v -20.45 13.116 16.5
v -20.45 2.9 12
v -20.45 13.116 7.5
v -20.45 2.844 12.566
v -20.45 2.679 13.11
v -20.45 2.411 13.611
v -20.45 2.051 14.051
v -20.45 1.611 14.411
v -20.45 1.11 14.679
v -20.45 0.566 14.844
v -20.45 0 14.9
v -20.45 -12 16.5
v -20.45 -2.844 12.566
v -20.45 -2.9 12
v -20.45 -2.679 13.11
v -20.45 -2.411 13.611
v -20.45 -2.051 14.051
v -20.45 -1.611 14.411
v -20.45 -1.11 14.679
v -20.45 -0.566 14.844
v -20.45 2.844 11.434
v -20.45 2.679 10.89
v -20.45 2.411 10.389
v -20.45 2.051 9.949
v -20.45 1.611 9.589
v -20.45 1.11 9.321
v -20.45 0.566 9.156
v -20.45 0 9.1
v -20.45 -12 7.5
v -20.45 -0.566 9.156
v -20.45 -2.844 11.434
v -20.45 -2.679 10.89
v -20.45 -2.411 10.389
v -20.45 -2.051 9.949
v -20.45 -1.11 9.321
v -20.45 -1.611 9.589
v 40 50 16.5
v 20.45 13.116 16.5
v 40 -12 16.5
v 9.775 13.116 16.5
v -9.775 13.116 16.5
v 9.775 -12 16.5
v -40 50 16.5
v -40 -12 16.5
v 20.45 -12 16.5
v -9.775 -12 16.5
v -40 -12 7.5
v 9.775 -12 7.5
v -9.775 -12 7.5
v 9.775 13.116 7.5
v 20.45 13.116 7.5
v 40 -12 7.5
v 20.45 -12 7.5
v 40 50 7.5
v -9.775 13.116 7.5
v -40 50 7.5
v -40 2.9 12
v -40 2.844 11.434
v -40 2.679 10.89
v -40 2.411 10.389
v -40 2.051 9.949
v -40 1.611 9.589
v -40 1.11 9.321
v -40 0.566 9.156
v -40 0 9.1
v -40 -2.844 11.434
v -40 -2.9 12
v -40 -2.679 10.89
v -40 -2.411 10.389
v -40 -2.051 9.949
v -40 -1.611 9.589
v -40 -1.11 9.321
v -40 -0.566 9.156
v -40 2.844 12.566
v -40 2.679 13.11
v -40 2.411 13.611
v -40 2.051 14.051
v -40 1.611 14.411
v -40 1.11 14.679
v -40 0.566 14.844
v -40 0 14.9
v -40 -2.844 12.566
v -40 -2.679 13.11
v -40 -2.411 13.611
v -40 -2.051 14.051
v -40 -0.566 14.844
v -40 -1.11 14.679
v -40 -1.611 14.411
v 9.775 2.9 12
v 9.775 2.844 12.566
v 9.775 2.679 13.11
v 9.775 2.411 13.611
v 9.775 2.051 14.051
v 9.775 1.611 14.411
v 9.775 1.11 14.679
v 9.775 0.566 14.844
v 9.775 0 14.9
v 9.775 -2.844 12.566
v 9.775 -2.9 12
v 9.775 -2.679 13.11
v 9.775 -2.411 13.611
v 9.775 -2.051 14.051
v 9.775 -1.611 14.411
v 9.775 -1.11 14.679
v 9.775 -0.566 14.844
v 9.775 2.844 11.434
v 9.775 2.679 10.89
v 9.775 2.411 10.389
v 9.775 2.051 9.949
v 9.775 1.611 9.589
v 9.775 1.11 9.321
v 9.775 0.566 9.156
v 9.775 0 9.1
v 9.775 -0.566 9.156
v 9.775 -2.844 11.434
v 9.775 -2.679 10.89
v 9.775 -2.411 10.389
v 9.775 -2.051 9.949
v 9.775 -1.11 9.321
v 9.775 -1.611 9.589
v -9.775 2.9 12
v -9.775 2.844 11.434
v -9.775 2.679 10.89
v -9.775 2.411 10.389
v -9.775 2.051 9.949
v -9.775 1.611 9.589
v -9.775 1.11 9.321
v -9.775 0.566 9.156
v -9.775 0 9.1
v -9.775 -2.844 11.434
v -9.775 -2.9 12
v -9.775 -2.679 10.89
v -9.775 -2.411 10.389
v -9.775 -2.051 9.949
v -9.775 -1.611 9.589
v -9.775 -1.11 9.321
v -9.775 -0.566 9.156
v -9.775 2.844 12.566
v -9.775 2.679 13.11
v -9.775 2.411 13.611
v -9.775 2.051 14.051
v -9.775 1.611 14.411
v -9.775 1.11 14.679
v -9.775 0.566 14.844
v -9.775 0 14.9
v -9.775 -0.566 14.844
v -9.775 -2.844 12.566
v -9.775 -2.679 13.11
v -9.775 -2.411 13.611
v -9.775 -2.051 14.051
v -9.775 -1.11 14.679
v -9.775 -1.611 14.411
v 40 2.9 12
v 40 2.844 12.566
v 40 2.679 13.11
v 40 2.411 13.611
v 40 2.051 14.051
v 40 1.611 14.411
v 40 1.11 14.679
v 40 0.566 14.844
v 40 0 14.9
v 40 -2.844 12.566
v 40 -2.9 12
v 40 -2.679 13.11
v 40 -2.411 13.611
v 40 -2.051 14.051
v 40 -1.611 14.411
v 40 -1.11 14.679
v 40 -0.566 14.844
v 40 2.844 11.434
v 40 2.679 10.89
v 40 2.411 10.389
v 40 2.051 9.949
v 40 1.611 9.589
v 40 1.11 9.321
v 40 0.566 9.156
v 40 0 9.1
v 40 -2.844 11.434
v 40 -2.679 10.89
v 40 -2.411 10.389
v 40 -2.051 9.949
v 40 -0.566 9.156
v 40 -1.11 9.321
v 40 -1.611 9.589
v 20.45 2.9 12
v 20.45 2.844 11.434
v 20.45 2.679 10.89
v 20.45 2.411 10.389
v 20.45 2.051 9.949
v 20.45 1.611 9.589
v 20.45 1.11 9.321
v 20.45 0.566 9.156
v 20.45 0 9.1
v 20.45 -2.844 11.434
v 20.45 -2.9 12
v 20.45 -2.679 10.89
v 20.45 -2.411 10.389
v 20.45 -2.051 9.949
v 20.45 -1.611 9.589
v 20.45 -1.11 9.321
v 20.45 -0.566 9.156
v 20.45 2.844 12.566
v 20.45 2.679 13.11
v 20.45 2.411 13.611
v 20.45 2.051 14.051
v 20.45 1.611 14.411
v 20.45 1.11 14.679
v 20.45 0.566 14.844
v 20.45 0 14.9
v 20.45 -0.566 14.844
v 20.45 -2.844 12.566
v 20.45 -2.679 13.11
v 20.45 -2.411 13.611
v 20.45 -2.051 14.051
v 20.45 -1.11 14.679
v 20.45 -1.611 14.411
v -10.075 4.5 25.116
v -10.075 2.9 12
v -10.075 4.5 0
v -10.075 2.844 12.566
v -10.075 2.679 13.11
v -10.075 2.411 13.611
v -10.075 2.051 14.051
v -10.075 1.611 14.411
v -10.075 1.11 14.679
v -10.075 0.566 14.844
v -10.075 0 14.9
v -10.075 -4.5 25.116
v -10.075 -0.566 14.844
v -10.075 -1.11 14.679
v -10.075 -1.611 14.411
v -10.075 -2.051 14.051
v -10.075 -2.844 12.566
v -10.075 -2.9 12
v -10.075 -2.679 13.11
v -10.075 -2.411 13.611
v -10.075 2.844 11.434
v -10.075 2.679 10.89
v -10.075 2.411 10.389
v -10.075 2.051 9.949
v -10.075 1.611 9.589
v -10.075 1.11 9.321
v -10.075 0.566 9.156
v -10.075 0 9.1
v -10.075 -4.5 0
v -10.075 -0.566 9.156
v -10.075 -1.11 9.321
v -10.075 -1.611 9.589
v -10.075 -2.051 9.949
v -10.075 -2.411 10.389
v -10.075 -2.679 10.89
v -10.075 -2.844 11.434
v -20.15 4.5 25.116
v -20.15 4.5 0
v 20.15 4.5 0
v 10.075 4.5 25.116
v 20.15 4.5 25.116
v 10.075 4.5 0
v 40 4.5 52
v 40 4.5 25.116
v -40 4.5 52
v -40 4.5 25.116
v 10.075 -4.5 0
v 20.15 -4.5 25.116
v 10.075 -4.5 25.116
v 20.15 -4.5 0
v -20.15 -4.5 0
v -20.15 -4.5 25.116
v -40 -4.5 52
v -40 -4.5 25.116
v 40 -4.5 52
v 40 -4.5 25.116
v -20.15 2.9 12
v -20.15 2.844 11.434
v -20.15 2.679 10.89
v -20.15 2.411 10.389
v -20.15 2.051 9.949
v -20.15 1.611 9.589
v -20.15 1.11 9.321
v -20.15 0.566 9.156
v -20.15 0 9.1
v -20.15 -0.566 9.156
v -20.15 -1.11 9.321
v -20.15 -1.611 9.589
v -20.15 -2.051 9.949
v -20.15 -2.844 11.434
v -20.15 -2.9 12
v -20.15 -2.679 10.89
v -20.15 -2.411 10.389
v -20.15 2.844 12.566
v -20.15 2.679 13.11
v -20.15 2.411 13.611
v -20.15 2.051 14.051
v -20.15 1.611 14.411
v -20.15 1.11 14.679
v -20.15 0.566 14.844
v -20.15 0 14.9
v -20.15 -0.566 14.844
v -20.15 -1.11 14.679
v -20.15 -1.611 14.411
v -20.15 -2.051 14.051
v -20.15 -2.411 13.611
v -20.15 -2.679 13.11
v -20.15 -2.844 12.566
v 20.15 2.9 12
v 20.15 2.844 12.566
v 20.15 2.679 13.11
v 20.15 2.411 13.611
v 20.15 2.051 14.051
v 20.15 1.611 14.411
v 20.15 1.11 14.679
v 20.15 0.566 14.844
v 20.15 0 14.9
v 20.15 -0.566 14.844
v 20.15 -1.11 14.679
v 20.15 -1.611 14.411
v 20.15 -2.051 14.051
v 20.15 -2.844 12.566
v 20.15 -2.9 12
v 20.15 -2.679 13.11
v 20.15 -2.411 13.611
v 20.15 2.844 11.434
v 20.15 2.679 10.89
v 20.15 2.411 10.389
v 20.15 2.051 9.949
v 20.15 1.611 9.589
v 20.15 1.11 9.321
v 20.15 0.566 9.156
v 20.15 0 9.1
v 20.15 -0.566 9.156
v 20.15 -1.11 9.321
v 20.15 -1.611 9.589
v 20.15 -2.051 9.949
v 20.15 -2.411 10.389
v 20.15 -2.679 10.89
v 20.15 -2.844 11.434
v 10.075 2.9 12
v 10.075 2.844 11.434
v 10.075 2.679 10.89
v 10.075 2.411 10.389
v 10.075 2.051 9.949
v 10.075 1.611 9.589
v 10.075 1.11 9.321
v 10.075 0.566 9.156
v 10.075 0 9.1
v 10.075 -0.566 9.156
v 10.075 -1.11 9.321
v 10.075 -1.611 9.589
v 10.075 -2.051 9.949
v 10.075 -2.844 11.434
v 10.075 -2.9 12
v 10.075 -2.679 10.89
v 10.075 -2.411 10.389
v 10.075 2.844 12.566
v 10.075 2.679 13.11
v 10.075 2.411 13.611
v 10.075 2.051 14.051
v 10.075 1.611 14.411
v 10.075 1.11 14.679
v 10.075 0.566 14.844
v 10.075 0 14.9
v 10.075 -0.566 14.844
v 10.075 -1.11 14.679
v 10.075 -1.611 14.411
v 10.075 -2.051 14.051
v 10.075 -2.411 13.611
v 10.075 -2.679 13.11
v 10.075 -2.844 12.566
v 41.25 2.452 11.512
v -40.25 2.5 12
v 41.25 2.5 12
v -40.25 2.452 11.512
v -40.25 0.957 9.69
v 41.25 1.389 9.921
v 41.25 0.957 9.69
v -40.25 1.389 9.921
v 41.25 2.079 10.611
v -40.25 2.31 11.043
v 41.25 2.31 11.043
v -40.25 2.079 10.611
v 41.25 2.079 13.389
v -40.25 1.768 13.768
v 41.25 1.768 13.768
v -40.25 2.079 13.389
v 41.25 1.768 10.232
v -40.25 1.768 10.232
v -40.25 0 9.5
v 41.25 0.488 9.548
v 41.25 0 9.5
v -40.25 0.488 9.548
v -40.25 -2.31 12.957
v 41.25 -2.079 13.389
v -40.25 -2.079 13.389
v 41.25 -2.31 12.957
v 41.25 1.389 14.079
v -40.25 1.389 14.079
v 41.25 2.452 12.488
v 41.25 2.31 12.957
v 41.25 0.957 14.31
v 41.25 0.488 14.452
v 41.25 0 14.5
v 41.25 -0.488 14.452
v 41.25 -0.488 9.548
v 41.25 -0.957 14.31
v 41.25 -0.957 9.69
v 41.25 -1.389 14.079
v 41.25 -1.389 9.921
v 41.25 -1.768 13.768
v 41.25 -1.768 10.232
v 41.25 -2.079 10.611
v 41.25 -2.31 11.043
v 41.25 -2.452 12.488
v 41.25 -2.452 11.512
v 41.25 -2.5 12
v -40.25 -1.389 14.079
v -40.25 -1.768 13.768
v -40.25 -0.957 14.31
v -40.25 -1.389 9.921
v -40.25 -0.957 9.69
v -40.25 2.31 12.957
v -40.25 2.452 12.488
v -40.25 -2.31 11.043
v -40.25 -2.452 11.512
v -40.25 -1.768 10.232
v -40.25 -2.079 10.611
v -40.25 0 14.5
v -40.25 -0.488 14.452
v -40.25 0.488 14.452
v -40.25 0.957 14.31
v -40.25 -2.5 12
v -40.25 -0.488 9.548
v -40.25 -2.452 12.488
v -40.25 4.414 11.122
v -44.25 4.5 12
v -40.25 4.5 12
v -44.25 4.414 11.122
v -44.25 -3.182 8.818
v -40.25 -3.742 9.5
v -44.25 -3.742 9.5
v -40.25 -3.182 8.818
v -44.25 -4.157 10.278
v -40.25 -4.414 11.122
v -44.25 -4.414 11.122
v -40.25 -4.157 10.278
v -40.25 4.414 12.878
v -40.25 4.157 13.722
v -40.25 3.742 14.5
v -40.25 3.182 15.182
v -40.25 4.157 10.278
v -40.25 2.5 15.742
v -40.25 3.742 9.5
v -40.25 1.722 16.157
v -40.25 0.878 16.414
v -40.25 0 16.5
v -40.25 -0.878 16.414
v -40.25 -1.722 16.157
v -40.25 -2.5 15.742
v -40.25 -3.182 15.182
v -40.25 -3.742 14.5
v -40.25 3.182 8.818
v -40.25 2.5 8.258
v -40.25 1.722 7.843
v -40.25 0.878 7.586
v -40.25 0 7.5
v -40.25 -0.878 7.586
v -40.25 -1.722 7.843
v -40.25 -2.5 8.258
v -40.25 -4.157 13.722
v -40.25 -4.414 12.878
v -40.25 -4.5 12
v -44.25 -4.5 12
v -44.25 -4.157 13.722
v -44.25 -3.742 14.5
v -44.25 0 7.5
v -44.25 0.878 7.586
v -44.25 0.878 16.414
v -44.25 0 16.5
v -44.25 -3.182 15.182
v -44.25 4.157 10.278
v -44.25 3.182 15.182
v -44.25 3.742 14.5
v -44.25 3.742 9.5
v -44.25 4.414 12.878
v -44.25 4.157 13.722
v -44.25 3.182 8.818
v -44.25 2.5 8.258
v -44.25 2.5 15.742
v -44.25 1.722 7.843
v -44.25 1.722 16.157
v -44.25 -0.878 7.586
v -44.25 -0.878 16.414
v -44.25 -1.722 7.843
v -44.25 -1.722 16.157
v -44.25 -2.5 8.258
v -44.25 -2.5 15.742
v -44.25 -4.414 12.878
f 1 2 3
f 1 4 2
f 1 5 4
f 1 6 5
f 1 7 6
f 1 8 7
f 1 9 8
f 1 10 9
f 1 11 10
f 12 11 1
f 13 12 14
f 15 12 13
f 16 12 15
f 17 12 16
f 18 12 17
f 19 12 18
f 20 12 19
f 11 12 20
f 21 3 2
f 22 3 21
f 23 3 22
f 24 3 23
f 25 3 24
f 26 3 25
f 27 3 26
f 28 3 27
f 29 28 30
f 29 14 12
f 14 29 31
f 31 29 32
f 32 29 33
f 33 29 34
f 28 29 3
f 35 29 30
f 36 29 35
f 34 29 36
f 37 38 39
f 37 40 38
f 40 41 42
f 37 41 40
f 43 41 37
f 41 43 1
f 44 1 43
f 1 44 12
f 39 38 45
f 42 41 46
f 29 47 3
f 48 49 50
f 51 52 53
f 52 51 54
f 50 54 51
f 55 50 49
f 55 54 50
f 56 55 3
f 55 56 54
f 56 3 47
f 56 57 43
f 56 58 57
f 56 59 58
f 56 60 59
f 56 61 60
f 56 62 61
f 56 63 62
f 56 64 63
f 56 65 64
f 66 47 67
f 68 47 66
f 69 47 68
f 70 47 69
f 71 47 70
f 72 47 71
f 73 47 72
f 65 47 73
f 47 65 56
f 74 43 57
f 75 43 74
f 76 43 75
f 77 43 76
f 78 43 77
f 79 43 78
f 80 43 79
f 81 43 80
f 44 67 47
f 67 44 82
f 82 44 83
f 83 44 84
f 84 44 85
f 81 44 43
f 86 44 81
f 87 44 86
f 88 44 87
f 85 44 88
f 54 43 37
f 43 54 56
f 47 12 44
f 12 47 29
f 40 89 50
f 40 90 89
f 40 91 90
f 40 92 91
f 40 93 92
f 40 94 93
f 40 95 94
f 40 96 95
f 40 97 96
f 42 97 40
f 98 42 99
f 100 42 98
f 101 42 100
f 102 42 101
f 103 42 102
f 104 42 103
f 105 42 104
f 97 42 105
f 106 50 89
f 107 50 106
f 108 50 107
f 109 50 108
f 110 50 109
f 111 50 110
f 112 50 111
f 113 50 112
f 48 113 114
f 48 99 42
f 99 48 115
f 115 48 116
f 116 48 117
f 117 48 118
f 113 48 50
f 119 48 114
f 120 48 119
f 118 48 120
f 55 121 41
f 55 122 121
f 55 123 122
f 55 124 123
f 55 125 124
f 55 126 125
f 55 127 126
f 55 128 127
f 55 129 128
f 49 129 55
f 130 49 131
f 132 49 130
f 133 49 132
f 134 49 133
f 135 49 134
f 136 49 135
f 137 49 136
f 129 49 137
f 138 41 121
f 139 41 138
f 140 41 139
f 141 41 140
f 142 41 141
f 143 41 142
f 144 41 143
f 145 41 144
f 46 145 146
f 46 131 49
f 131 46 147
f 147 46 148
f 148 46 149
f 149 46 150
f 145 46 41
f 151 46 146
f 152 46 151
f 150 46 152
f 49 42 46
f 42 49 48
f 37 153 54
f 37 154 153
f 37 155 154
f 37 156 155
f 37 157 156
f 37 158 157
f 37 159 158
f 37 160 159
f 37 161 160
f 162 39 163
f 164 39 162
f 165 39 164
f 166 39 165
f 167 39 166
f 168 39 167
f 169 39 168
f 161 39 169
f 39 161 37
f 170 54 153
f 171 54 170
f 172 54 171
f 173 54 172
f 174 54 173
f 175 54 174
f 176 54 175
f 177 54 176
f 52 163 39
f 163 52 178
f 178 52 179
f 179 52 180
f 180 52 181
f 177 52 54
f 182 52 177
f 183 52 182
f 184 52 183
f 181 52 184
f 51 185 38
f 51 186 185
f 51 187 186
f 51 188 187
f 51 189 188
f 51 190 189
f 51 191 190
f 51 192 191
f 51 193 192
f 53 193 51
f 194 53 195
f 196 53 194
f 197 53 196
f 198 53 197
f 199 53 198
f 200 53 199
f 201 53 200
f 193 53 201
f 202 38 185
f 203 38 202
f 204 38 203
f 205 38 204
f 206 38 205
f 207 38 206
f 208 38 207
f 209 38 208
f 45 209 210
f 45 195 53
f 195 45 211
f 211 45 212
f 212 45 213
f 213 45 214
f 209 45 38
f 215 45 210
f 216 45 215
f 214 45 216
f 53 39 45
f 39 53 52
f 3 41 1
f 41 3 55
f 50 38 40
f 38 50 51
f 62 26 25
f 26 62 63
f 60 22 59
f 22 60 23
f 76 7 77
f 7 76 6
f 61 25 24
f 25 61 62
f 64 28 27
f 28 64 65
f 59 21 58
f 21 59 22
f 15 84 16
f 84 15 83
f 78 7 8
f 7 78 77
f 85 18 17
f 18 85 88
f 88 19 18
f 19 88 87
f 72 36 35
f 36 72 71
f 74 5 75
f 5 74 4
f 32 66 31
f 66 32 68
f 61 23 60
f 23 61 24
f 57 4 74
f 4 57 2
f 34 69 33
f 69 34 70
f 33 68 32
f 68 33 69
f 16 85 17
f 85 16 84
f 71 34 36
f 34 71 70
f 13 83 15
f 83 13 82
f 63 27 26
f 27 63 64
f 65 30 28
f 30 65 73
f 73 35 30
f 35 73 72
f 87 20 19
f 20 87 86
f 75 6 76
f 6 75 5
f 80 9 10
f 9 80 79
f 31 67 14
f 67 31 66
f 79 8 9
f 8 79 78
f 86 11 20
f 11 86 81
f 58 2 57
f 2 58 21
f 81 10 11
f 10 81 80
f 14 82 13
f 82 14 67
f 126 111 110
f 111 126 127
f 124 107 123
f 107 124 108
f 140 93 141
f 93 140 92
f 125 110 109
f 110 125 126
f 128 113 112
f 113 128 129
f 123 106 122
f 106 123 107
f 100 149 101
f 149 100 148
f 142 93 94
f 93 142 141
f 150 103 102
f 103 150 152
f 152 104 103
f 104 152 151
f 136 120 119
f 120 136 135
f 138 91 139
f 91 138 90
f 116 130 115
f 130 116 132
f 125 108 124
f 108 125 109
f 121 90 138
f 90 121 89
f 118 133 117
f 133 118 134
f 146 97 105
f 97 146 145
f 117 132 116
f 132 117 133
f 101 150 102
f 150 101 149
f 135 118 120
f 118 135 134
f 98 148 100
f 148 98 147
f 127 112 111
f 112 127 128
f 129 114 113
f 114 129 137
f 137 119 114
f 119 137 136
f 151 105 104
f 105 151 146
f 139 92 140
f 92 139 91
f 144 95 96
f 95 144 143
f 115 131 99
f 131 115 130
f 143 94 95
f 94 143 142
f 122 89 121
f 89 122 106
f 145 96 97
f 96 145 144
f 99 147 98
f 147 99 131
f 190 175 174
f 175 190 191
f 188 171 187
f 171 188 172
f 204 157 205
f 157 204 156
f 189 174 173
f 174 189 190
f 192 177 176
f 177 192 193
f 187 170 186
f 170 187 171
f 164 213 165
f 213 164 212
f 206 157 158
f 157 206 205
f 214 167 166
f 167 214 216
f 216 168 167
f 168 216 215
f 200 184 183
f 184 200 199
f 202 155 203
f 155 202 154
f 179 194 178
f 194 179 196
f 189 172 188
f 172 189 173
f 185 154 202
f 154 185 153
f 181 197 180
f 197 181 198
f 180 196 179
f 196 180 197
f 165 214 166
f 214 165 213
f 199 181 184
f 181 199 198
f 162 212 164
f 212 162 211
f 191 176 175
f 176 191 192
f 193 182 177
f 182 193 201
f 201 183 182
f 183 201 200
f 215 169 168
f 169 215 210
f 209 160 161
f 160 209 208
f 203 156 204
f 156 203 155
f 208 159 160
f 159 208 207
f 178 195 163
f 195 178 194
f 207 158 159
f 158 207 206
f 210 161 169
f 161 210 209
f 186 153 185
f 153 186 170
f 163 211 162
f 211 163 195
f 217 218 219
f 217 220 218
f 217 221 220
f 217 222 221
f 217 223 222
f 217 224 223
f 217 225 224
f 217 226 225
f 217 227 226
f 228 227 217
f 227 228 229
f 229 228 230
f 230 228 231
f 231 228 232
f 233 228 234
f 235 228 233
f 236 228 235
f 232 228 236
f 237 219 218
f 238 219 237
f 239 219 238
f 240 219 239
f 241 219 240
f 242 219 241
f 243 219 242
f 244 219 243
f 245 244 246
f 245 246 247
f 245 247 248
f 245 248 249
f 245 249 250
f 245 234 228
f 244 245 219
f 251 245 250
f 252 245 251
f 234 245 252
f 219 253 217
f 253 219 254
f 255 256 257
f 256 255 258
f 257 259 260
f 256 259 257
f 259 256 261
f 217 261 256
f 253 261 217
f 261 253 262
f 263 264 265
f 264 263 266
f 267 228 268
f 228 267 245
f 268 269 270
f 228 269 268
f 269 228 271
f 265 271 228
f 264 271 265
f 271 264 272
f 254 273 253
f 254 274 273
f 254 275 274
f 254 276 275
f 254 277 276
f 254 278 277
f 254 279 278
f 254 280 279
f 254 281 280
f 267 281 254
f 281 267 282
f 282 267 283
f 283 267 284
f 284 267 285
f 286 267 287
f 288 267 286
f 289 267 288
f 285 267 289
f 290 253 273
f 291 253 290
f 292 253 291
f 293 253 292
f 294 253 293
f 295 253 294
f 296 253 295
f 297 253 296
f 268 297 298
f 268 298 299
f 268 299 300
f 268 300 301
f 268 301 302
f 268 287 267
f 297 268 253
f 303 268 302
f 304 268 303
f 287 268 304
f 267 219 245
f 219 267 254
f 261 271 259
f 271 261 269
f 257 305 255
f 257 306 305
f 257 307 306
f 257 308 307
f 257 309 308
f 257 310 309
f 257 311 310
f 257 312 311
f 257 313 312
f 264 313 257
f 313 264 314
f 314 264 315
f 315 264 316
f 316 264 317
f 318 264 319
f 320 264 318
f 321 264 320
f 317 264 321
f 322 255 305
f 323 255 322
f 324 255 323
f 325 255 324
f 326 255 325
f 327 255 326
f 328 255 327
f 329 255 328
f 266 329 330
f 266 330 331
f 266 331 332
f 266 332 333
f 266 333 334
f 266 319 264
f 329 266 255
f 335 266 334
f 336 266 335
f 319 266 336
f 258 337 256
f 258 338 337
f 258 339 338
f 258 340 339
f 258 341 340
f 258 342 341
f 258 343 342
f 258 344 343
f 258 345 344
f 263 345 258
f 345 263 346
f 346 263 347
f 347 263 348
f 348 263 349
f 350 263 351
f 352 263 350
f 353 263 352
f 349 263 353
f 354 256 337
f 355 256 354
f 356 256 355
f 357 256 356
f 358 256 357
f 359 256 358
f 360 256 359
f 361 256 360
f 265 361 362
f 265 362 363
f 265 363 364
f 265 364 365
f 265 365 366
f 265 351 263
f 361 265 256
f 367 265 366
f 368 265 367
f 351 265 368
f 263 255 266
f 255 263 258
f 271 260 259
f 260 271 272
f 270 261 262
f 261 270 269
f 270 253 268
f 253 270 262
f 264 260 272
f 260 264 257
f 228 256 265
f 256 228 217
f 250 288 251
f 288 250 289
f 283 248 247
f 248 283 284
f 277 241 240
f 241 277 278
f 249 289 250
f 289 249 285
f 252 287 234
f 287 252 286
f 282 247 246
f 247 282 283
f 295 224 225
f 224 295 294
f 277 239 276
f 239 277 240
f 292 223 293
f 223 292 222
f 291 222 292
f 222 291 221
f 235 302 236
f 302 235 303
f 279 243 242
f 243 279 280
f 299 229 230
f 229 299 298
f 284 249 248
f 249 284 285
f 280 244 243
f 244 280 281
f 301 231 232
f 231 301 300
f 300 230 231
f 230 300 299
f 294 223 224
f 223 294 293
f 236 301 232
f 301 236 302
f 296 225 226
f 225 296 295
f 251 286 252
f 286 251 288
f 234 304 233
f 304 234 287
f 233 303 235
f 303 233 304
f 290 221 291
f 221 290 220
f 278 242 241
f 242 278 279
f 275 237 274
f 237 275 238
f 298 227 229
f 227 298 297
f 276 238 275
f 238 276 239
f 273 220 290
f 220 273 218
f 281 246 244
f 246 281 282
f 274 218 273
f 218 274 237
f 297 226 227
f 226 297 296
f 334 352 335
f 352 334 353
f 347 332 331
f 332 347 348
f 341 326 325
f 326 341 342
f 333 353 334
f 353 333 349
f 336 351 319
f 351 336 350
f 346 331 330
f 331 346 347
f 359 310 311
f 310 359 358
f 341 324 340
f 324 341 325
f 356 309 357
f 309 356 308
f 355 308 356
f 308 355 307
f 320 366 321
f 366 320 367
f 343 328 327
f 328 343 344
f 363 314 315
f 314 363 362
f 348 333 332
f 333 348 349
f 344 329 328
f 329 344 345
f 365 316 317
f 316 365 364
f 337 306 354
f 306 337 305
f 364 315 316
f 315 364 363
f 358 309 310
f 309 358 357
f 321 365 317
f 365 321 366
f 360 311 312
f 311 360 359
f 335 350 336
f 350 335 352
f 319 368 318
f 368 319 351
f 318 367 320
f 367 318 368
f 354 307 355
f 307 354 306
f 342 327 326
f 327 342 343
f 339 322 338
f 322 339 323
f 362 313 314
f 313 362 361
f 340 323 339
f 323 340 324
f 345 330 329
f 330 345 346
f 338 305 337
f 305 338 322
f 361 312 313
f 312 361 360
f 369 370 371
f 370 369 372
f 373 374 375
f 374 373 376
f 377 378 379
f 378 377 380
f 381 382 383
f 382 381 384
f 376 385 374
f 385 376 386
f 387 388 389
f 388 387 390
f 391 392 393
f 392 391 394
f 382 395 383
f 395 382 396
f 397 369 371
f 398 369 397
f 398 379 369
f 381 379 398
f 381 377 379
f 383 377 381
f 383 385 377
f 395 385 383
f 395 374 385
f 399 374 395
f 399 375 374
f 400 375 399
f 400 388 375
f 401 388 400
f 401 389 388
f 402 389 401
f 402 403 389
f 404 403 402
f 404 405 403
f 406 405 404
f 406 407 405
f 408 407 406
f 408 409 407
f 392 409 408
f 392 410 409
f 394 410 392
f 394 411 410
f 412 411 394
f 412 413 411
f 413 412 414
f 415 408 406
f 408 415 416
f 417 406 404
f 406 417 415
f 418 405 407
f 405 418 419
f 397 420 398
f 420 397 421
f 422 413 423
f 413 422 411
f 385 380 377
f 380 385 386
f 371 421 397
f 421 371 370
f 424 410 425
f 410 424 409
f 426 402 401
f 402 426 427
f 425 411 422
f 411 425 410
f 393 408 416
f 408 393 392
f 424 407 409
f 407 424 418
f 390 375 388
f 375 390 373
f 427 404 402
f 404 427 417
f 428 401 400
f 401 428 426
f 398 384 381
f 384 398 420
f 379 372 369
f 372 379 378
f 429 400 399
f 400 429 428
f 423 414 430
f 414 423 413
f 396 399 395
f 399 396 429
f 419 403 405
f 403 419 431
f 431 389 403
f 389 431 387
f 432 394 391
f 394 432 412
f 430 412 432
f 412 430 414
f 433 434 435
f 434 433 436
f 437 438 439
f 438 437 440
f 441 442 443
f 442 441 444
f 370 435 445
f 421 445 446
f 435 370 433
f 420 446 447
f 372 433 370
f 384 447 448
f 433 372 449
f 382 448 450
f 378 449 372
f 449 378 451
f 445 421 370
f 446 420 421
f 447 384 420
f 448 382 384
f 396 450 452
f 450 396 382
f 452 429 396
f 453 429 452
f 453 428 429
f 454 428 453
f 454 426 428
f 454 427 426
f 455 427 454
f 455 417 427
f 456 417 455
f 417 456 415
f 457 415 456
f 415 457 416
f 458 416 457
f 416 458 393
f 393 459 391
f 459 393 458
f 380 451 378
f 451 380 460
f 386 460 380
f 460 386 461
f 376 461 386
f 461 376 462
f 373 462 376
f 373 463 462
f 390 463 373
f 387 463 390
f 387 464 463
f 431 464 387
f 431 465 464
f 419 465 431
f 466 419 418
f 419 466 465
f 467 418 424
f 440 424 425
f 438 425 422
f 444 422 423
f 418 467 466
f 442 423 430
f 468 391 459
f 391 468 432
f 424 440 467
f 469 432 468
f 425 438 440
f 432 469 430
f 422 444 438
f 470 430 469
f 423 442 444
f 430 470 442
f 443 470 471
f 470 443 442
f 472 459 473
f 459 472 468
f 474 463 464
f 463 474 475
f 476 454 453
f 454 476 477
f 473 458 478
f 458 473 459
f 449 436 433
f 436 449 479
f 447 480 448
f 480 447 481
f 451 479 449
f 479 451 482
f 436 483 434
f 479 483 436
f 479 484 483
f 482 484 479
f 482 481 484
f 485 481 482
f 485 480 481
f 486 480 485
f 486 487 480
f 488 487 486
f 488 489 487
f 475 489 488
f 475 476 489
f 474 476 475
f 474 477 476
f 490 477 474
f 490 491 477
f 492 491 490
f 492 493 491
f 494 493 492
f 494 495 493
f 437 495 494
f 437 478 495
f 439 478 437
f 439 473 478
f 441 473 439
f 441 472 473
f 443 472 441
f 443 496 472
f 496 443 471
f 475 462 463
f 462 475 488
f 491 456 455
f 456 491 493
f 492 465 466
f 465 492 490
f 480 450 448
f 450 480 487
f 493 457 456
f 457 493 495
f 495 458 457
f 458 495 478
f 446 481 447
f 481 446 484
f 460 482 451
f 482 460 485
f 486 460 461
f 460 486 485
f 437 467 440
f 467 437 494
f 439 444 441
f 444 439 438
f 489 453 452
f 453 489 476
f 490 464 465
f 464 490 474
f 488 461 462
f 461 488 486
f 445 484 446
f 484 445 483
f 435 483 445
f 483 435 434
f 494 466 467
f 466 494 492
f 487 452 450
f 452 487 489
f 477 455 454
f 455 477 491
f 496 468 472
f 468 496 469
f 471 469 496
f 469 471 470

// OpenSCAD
$fn = 32;

// ------------------------------------------------------------------------
// Butt hinge: hinge 80 mm, leaf swung 270 deg
// Every part is its own module, assembly() places every instance.
// ------------------------------------------------------------------------

// --- part 1 ---
module hinge_base() {
  difference() {
    union() {
      translate([-40, -12, -4.5]) cube([19.55, 62, 9]);
      translate([-9.775, -12, -4.5]) cube([19.55, 62, 9]);
      translate([20.45, -12, -4.5]) cube([19.55, 62, 9]);
      translate([-40, 13.116, -4.5]) cube([80, 36.884, 9]);
    }
    translate([-30.225, 0, 0]) rotate([0, 90, 0]) cylinder(h = 21.55, d = 5.8, center = true);
    translate([0, 0, 0]) rotate([0, 90, 0]) cylinder(h = 21.55, d = 5.8, center = true);
    translate([30.225, 0, 0]) rotate([0, 90, 0]) cylinder(h = 21.55, d = 5.8, center = true);
  }
}

// --- part 2 ---
module hinge_mover() {
  difference() {
    union() {
      translate([-20.15, -40, -4.5]) cube([10.075, 52, 9]);
      translate([10.075, -40, -4.5]) cube([10.075, 52, 9]);
      translate([-40, -40, -4.5]) cube([80, 26.884, 9]);
    }
    translate([-15.113, 0, 0]) rotate([0, 90, 0]) cylinder(h = 12.075, d = 5.8, center = true);
    translate([15.113, 0, 0]) rotate([0, 90, 0]) cylinder(h = 12.075, d = 5.8, center = true);
  }
}

// --- part 3 ---
module hinge_pin() {
  rotate([0, 90, 0]) cylinder(h = 82.5, d = 5, center = true);
  translate([-44.25, 0, 0]) rotate([0, 90, 0]) cylinder(h = 4, d = 9);
}

// --- assembly ---
module assembly() {
  color([0.80, 0.24, 0.20]) translate([0, 0, 12]) rotate([0, 0, 0]) hinge_base();
  color([0.20, 0.45, 0.75]) translate([0, 0, 12]) rotate([270, 0, 0]) hinge_mover();
  color([0.25, 0.62, 0.32]) translate([0, 0, 12]) rotate([0, 0, 0]) hinge_pin();
}

assembly();
